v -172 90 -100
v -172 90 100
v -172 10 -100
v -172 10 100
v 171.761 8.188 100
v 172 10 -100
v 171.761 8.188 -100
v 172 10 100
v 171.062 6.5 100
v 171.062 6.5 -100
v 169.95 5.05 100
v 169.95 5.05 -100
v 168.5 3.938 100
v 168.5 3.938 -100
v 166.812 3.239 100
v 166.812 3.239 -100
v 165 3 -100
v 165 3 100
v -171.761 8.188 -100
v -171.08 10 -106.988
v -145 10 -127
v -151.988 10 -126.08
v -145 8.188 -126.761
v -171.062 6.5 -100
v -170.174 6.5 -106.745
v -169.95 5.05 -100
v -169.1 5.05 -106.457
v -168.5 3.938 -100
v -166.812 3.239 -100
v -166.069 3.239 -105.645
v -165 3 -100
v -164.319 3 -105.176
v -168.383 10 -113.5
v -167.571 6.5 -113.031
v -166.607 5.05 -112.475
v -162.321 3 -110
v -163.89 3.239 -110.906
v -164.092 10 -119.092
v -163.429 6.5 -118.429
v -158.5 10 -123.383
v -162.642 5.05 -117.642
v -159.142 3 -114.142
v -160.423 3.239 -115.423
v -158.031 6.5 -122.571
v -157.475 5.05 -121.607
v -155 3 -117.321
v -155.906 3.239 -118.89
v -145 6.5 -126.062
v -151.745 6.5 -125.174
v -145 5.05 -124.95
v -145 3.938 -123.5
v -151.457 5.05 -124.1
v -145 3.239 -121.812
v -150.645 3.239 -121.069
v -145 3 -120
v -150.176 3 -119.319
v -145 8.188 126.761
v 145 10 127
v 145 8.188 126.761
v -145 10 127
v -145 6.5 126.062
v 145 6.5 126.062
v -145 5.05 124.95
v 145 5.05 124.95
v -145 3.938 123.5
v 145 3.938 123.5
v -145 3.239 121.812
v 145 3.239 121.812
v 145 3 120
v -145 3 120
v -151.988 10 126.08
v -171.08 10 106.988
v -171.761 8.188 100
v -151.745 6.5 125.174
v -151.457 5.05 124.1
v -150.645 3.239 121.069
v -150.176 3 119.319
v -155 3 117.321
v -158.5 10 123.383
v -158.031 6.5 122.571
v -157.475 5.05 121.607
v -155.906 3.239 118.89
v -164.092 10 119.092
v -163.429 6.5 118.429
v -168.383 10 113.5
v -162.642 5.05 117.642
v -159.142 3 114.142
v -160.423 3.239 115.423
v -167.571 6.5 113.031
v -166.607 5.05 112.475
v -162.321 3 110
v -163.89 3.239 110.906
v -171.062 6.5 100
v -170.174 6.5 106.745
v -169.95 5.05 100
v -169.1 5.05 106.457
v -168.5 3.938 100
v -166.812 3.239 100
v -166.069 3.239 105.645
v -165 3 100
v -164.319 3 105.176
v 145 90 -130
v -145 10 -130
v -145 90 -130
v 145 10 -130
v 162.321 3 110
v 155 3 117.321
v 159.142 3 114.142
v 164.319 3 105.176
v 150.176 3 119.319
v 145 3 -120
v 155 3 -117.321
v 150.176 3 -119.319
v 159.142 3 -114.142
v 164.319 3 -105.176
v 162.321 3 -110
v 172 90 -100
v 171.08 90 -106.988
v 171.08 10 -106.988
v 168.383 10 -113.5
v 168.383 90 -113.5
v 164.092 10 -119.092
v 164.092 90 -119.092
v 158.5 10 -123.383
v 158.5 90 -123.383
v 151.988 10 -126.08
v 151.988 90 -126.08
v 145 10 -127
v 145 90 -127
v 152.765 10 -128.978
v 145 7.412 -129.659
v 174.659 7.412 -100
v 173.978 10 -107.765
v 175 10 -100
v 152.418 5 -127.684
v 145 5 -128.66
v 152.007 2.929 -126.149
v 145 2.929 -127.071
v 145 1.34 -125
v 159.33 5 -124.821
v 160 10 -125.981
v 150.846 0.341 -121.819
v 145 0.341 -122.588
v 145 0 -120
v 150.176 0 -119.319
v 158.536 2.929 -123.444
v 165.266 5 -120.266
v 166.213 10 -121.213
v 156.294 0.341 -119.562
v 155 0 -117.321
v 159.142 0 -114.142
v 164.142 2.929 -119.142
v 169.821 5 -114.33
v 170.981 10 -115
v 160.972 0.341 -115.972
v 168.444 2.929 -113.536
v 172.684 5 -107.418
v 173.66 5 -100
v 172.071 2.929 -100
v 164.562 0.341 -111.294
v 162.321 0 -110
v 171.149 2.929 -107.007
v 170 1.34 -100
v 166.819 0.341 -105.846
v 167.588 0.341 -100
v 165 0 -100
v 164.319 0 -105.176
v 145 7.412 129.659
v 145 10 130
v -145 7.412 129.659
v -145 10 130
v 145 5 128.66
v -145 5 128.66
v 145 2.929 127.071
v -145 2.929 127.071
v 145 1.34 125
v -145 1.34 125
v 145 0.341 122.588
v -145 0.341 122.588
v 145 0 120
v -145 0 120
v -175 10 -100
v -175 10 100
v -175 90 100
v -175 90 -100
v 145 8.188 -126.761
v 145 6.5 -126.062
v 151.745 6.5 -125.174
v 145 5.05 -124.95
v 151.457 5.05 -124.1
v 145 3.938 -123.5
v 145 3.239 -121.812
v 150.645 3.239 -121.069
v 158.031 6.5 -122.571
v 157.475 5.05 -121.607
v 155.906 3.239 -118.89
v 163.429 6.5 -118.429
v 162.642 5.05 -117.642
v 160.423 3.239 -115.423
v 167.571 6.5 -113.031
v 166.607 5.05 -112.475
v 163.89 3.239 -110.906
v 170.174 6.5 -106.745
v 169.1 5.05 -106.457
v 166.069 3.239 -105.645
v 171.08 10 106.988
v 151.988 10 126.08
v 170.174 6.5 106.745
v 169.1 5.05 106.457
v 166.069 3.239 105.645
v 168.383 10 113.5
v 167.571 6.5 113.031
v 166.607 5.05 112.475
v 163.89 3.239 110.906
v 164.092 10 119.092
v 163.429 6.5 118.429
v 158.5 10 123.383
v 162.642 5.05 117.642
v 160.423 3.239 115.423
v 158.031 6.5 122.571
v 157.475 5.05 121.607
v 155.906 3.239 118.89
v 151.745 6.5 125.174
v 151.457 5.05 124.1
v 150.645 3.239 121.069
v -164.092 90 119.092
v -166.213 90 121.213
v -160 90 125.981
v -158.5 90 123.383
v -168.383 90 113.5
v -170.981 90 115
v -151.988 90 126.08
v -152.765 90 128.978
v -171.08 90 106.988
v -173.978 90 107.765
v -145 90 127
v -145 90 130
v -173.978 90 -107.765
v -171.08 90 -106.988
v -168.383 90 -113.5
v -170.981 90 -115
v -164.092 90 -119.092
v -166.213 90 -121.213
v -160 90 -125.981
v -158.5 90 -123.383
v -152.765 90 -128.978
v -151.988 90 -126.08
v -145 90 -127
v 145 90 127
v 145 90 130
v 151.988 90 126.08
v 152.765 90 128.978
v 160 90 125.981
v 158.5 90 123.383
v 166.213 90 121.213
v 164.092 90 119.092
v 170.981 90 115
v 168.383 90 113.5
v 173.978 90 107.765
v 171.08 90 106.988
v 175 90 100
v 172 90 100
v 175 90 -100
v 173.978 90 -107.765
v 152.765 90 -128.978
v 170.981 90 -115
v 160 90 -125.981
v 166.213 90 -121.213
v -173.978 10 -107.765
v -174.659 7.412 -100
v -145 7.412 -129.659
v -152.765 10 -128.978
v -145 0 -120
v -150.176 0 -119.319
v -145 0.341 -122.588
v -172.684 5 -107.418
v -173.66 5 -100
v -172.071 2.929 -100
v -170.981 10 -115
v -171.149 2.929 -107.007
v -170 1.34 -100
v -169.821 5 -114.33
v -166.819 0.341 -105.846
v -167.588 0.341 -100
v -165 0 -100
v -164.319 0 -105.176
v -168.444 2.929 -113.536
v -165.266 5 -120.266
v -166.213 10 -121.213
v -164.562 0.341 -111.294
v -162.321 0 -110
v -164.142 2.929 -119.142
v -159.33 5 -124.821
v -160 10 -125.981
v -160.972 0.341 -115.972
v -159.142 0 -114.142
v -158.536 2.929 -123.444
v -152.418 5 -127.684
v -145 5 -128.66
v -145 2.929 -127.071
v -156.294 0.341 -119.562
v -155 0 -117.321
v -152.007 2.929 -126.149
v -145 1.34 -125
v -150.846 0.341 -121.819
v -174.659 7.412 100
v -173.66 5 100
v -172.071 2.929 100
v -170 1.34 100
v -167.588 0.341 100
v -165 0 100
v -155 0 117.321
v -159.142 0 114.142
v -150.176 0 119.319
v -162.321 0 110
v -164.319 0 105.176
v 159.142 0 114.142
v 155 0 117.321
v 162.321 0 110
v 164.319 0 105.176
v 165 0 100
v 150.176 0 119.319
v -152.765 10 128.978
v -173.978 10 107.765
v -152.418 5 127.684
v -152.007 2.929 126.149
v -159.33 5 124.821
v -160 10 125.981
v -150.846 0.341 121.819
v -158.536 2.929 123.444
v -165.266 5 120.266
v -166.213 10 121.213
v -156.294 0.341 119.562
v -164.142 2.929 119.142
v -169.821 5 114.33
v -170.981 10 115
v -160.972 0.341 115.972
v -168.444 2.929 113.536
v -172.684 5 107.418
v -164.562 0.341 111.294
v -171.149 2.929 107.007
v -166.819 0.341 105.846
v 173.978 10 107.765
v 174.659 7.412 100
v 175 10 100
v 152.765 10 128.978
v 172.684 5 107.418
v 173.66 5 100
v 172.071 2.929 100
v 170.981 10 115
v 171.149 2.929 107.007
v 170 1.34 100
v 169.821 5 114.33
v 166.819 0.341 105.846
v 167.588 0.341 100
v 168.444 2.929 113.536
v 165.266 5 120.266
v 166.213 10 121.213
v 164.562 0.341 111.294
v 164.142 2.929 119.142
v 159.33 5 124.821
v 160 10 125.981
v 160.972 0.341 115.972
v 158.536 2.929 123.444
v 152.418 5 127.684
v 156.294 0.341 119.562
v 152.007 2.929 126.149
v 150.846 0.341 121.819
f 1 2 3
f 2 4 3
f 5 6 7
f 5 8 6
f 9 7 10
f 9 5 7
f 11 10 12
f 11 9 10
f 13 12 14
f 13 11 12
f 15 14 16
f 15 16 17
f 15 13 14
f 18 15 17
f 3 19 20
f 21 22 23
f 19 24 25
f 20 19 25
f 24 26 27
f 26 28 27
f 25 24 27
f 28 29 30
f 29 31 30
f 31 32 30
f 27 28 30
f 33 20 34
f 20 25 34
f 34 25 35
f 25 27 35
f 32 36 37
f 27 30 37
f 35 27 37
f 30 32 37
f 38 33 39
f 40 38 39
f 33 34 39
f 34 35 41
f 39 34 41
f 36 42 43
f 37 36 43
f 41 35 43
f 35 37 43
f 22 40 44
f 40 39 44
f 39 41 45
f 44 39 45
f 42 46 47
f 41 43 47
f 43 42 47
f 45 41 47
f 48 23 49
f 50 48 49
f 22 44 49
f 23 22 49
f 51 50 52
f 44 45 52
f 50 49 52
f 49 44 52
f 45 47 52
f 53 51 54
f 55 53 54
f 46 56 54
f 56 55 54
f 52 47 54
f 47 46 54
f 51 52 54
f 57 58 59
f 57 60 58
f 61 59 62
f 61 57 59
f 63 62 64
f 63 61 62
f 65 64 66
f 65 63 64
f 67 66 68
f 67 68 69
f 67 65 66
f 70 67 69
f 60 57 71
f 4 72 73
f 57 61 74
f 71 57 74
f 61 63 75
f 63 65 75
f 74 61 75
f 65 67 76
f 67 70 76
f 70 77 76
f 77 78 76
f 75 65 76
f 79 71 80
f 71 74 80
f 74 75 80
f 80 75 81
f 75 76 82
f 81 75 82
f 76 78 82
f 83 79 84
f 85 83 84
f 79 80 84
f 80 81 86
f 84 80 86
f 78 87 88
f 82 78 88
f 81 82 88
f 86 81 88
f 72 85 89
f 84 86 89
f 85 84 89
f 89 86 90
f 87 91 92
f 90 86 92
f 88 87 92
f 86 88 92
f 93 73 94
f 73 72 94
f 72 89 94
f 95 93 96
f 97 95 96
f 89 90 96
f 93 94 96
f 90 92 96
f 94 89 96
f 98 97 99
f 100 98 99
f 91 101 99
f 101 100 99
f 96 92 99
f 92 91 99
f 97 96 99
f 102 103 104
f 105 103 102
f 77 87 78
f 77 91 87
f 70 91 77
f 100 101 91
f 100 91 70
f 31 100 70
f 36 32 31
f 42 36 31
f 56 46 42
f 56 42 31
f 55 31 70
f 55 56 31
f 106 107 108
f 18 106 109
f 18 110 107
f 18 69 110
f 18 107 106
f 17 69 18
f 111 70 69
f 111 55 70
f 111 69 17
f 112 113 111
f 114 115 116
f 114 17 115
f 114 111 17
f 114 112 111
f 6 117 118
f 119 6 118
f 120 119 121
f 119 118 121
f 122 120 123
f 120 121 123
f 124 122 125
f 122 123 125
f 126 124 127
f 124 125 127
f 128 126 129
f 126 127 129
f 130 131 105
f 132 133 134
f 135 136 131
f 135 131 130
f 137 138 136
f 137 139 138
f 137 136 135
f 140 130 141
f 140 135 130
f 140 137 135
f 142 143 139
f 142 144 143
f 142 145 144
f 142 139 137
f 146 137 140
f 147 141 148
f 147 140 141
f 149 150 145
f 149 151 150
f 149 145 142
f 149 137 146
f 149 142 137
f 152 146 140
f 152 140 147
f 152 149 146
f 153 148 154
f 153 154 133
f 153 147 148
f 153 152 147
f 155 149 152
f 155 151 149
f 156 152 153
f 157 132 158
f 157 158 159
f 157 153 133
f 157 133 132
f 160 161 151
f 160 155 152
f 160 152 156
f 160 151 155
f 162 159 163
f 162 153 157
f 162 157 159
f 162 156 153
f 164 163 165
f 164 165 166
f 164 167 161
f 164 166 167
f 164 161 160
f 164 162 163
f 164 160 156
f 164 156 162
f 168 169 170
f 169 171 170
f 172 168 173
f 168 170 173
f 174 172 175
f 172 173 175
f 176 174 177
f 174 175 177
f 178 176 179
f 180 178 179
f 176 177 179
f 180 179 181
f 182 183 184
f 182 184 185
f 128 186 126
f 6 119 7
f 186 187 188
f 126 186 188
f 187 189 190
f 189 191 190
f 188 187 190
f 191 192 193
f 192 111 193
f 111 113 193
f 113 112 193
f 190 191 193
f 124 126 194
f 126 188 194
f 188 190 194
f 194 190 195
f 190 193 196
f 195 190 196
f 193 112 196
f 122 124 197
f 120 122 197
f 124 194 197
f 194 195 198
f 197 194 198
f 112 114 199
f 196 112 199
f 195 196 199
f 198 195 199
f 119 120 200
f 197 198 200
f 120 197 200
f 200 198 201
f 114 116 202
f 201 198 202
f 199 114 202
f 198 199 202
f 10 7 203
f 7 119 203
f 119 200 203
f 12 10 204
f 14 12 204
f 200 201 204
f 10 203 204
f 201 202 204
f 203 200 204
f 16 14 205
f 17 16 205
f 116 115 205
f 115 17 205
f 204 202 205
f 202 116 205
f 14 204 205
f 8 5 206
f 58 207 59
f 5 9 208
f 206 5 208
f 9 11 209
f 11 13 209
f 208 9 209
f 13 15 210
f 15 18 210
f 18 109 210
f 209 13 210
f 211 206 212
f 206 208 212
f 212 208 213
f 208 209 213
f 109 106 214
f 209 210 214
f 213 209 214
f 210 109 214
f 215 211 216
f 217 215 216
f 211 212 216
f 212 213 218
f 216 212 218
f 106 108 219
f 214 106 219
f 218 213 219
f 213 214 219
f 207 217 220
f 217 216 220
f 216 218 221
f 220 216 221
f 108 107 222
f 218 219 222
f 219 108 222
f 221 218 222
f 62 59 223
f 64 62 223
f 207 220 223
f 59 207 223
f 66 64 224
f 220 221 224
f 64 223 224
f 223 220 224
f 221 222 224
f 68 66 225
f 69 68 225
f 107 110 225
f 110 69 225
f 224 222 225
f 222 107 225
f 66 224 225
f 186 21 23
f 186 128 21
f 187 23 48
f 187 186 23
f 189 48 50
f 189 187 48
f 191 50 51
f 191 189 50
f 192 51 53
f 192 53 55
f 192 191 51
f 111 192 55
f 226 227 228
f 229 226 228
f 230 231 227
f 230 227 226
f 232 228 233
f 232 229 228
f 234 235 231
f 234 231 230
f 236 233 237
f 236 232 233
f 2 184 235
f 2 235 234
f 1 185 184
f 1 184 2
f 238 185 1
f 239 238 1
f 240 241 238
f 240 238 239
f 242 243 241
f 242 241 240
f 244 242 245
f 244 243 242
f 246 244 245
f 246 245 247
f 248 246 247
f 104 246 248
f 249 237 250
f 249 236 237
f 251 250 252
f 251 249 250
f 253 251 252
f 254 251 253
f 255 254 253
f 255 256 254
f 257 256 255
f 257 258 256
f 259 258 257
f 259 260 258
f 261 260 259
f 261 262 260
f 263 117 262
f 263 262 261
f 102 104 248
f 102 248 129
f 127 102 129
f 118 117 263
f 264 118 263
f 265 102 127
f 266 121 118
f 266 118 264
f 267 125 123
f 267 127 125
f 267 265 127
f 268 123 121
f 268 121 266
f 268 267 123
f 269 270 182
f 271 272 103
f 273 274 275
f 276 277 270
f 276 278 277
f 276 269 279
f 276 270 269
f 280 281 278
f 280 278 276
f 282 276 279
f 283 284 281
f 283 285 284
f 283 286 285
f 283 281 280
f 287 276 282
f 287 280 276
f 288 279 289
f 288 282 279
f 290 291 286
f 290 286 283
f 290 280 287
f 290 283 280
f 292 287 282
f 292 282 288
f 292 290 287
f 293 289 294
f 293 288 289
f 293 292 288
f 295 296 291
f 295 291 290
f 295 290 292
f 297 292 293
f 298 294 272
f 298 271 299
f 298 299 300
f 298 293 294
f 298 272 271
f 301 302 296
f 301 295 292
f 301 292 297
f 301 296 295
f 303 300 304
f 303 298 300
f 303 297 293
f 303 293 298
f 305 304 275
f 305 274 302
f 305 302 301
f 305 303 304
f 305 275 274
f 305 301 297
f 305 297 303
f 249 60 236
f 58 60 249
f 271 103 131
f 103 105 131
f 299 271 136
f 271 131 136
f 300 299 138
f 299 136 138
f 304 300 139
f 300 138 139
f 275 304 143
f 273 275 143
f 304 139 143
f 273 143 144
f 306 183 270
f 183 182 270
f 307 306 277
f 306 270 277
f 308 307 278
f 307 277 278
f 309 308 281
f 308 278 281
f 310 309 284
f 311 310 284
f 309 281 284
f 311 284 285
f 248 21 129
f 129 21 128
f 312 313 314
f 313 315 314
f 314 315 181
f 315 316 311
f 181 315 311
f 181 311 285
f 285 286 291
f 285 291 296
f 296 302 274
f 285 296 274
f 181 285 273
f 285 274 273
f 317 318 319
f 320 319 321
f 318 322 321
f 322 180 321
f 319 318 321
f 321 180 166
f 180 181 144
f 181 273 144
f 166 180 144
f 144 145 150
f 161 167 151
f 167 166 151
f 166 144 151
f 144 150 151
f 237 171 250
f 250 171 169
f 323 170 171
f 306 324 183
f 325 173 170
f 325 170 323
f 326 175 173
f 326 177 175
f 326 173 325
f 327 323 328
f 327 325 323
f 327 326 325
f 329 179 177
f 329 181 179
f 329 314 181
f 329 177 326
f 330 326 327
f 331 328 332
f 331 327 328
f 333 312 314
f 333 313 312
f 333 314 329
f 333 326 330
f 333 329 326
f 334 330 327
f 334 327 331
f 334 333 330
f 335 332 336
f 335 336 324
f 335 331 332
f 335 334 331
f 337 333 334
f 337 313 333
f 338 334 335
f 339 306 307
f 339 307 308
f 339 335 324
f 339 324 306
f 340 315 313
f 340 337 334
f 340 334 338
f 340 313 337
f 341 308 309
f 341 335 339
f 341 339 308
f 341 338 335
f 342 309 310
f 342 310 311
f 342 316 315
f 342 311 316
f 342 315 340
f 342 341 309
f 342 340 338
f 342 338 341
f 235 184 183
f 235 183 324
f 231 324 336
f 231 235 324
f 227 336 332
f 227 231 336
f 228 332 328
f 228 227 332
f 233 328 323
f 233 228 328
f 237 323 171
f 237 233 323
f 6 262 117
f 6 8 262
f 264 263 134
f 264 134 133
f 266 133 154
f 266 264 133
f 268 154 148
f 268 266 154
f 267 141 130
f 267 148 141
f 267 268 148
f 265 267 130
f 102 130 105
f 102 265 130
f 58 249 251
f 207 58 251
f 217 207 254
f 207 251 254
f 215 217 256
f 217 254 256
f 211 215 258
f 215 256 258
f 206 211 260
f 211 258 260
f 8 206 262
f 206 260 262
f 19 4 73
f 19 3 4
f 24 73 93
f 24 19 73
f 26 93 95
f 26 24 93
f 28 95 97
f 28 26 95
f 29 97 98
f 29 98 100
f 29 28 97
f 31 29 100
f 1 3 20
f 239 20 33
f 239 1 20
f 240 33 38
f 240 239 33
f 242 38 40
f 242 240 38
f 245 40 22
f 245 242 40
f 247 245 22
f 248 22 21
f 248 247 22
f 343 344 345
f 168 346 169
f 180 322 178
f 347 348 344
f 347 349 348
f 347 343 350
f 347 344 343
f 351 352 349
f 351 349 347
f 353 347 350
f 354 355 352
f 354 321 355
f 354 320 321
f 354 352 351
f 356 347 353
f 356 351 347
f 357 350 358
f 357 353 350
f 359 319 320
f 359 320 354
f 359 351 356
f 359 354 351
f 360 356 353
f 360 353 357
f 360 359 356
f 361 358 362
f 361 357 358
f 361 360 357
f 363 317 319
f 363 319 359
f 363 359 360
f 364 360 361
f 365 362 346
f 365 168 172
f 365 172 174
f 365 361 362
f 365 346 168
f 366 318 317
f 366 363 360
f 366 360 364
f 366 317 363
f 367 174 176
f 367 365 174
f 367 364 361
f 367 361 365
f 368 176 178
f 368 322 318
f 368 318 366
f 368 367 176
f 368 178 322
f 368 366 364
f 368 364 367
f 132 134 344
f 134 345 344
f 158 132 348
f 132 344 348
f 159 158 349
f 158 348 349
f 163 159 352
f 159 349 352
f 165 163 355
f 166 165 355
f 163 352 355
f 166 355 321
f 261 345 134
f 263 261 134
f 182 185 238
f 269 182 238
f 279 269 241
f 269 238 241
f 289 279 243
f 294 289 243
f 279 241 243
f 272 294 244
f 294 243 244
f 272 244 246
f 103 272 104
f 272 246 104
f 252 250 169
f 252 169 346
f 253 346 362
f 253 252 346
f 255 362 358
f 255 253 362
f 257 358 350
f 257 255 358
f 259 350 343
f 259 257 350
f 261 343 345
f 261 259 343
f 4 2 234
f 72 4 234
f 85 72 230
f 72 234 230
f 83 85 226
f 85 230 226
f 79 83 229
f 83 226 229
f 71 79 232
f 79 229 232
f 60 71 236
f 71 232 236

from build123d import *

# Parameters (mm, degrees)
SKETCH_1_W      = 350
SKETCH_1_H      = 260
EXTRUDE_1_DEPTH = 90
FILLET_1_R      = 30
FILLET_2_R      = 10
SHELL_1_T       = -3


with BuildPart() as part:
    # 草圖1 → 填料-伸長1 (new body)
    with BuildSketch(Plane(origin=(0, 0, 0), x_dir=(1, 0, 0), z_dir=(0, 1, 0))):
        Rectangle(SKETCH_1_W, SKETCH_1_H)
    extrude(amount=EXTRUDE_1_DEPTH)

    # 圓角1
    fillet_1_edges = [part.edges().sort_by_distance(p)[0] for p in [
        (175, 45, 130),
        (-175, 45, 130),
        (-175, 45, -130),
        (175, 45, -130),
    ]]
    fillet(fillet_1_edges, radius=FILLET_1_R)

    # 圓角2
    fillet_2_edges = [part.edges().sort_by_distance(p)[0] for p in [
        (-175, 0, 0),
        (175, 0, 0),
        (0, 0, 130),
        (0, 0, -130),
        (166.213203436, 0, 121.213203436),
        (166.213203436, 0, -121.213203436),
        (-166.213203436, 0, 121.213203436),
        (-166.213203436, 0, -121.213203436),
    ]]
    fillet(fillet_2_edges, radius=FILLET_2_R)

    # 薄殼1
    shell_1_openings = [part.faces().sort_by_distance(p)[0] for p in [
        (0, 90, 0),
    ]]
    offset(amount=SHELL_1_T, openings=shell_1_openings, kind=Kind.INTERSECTION)


solid = part.part
